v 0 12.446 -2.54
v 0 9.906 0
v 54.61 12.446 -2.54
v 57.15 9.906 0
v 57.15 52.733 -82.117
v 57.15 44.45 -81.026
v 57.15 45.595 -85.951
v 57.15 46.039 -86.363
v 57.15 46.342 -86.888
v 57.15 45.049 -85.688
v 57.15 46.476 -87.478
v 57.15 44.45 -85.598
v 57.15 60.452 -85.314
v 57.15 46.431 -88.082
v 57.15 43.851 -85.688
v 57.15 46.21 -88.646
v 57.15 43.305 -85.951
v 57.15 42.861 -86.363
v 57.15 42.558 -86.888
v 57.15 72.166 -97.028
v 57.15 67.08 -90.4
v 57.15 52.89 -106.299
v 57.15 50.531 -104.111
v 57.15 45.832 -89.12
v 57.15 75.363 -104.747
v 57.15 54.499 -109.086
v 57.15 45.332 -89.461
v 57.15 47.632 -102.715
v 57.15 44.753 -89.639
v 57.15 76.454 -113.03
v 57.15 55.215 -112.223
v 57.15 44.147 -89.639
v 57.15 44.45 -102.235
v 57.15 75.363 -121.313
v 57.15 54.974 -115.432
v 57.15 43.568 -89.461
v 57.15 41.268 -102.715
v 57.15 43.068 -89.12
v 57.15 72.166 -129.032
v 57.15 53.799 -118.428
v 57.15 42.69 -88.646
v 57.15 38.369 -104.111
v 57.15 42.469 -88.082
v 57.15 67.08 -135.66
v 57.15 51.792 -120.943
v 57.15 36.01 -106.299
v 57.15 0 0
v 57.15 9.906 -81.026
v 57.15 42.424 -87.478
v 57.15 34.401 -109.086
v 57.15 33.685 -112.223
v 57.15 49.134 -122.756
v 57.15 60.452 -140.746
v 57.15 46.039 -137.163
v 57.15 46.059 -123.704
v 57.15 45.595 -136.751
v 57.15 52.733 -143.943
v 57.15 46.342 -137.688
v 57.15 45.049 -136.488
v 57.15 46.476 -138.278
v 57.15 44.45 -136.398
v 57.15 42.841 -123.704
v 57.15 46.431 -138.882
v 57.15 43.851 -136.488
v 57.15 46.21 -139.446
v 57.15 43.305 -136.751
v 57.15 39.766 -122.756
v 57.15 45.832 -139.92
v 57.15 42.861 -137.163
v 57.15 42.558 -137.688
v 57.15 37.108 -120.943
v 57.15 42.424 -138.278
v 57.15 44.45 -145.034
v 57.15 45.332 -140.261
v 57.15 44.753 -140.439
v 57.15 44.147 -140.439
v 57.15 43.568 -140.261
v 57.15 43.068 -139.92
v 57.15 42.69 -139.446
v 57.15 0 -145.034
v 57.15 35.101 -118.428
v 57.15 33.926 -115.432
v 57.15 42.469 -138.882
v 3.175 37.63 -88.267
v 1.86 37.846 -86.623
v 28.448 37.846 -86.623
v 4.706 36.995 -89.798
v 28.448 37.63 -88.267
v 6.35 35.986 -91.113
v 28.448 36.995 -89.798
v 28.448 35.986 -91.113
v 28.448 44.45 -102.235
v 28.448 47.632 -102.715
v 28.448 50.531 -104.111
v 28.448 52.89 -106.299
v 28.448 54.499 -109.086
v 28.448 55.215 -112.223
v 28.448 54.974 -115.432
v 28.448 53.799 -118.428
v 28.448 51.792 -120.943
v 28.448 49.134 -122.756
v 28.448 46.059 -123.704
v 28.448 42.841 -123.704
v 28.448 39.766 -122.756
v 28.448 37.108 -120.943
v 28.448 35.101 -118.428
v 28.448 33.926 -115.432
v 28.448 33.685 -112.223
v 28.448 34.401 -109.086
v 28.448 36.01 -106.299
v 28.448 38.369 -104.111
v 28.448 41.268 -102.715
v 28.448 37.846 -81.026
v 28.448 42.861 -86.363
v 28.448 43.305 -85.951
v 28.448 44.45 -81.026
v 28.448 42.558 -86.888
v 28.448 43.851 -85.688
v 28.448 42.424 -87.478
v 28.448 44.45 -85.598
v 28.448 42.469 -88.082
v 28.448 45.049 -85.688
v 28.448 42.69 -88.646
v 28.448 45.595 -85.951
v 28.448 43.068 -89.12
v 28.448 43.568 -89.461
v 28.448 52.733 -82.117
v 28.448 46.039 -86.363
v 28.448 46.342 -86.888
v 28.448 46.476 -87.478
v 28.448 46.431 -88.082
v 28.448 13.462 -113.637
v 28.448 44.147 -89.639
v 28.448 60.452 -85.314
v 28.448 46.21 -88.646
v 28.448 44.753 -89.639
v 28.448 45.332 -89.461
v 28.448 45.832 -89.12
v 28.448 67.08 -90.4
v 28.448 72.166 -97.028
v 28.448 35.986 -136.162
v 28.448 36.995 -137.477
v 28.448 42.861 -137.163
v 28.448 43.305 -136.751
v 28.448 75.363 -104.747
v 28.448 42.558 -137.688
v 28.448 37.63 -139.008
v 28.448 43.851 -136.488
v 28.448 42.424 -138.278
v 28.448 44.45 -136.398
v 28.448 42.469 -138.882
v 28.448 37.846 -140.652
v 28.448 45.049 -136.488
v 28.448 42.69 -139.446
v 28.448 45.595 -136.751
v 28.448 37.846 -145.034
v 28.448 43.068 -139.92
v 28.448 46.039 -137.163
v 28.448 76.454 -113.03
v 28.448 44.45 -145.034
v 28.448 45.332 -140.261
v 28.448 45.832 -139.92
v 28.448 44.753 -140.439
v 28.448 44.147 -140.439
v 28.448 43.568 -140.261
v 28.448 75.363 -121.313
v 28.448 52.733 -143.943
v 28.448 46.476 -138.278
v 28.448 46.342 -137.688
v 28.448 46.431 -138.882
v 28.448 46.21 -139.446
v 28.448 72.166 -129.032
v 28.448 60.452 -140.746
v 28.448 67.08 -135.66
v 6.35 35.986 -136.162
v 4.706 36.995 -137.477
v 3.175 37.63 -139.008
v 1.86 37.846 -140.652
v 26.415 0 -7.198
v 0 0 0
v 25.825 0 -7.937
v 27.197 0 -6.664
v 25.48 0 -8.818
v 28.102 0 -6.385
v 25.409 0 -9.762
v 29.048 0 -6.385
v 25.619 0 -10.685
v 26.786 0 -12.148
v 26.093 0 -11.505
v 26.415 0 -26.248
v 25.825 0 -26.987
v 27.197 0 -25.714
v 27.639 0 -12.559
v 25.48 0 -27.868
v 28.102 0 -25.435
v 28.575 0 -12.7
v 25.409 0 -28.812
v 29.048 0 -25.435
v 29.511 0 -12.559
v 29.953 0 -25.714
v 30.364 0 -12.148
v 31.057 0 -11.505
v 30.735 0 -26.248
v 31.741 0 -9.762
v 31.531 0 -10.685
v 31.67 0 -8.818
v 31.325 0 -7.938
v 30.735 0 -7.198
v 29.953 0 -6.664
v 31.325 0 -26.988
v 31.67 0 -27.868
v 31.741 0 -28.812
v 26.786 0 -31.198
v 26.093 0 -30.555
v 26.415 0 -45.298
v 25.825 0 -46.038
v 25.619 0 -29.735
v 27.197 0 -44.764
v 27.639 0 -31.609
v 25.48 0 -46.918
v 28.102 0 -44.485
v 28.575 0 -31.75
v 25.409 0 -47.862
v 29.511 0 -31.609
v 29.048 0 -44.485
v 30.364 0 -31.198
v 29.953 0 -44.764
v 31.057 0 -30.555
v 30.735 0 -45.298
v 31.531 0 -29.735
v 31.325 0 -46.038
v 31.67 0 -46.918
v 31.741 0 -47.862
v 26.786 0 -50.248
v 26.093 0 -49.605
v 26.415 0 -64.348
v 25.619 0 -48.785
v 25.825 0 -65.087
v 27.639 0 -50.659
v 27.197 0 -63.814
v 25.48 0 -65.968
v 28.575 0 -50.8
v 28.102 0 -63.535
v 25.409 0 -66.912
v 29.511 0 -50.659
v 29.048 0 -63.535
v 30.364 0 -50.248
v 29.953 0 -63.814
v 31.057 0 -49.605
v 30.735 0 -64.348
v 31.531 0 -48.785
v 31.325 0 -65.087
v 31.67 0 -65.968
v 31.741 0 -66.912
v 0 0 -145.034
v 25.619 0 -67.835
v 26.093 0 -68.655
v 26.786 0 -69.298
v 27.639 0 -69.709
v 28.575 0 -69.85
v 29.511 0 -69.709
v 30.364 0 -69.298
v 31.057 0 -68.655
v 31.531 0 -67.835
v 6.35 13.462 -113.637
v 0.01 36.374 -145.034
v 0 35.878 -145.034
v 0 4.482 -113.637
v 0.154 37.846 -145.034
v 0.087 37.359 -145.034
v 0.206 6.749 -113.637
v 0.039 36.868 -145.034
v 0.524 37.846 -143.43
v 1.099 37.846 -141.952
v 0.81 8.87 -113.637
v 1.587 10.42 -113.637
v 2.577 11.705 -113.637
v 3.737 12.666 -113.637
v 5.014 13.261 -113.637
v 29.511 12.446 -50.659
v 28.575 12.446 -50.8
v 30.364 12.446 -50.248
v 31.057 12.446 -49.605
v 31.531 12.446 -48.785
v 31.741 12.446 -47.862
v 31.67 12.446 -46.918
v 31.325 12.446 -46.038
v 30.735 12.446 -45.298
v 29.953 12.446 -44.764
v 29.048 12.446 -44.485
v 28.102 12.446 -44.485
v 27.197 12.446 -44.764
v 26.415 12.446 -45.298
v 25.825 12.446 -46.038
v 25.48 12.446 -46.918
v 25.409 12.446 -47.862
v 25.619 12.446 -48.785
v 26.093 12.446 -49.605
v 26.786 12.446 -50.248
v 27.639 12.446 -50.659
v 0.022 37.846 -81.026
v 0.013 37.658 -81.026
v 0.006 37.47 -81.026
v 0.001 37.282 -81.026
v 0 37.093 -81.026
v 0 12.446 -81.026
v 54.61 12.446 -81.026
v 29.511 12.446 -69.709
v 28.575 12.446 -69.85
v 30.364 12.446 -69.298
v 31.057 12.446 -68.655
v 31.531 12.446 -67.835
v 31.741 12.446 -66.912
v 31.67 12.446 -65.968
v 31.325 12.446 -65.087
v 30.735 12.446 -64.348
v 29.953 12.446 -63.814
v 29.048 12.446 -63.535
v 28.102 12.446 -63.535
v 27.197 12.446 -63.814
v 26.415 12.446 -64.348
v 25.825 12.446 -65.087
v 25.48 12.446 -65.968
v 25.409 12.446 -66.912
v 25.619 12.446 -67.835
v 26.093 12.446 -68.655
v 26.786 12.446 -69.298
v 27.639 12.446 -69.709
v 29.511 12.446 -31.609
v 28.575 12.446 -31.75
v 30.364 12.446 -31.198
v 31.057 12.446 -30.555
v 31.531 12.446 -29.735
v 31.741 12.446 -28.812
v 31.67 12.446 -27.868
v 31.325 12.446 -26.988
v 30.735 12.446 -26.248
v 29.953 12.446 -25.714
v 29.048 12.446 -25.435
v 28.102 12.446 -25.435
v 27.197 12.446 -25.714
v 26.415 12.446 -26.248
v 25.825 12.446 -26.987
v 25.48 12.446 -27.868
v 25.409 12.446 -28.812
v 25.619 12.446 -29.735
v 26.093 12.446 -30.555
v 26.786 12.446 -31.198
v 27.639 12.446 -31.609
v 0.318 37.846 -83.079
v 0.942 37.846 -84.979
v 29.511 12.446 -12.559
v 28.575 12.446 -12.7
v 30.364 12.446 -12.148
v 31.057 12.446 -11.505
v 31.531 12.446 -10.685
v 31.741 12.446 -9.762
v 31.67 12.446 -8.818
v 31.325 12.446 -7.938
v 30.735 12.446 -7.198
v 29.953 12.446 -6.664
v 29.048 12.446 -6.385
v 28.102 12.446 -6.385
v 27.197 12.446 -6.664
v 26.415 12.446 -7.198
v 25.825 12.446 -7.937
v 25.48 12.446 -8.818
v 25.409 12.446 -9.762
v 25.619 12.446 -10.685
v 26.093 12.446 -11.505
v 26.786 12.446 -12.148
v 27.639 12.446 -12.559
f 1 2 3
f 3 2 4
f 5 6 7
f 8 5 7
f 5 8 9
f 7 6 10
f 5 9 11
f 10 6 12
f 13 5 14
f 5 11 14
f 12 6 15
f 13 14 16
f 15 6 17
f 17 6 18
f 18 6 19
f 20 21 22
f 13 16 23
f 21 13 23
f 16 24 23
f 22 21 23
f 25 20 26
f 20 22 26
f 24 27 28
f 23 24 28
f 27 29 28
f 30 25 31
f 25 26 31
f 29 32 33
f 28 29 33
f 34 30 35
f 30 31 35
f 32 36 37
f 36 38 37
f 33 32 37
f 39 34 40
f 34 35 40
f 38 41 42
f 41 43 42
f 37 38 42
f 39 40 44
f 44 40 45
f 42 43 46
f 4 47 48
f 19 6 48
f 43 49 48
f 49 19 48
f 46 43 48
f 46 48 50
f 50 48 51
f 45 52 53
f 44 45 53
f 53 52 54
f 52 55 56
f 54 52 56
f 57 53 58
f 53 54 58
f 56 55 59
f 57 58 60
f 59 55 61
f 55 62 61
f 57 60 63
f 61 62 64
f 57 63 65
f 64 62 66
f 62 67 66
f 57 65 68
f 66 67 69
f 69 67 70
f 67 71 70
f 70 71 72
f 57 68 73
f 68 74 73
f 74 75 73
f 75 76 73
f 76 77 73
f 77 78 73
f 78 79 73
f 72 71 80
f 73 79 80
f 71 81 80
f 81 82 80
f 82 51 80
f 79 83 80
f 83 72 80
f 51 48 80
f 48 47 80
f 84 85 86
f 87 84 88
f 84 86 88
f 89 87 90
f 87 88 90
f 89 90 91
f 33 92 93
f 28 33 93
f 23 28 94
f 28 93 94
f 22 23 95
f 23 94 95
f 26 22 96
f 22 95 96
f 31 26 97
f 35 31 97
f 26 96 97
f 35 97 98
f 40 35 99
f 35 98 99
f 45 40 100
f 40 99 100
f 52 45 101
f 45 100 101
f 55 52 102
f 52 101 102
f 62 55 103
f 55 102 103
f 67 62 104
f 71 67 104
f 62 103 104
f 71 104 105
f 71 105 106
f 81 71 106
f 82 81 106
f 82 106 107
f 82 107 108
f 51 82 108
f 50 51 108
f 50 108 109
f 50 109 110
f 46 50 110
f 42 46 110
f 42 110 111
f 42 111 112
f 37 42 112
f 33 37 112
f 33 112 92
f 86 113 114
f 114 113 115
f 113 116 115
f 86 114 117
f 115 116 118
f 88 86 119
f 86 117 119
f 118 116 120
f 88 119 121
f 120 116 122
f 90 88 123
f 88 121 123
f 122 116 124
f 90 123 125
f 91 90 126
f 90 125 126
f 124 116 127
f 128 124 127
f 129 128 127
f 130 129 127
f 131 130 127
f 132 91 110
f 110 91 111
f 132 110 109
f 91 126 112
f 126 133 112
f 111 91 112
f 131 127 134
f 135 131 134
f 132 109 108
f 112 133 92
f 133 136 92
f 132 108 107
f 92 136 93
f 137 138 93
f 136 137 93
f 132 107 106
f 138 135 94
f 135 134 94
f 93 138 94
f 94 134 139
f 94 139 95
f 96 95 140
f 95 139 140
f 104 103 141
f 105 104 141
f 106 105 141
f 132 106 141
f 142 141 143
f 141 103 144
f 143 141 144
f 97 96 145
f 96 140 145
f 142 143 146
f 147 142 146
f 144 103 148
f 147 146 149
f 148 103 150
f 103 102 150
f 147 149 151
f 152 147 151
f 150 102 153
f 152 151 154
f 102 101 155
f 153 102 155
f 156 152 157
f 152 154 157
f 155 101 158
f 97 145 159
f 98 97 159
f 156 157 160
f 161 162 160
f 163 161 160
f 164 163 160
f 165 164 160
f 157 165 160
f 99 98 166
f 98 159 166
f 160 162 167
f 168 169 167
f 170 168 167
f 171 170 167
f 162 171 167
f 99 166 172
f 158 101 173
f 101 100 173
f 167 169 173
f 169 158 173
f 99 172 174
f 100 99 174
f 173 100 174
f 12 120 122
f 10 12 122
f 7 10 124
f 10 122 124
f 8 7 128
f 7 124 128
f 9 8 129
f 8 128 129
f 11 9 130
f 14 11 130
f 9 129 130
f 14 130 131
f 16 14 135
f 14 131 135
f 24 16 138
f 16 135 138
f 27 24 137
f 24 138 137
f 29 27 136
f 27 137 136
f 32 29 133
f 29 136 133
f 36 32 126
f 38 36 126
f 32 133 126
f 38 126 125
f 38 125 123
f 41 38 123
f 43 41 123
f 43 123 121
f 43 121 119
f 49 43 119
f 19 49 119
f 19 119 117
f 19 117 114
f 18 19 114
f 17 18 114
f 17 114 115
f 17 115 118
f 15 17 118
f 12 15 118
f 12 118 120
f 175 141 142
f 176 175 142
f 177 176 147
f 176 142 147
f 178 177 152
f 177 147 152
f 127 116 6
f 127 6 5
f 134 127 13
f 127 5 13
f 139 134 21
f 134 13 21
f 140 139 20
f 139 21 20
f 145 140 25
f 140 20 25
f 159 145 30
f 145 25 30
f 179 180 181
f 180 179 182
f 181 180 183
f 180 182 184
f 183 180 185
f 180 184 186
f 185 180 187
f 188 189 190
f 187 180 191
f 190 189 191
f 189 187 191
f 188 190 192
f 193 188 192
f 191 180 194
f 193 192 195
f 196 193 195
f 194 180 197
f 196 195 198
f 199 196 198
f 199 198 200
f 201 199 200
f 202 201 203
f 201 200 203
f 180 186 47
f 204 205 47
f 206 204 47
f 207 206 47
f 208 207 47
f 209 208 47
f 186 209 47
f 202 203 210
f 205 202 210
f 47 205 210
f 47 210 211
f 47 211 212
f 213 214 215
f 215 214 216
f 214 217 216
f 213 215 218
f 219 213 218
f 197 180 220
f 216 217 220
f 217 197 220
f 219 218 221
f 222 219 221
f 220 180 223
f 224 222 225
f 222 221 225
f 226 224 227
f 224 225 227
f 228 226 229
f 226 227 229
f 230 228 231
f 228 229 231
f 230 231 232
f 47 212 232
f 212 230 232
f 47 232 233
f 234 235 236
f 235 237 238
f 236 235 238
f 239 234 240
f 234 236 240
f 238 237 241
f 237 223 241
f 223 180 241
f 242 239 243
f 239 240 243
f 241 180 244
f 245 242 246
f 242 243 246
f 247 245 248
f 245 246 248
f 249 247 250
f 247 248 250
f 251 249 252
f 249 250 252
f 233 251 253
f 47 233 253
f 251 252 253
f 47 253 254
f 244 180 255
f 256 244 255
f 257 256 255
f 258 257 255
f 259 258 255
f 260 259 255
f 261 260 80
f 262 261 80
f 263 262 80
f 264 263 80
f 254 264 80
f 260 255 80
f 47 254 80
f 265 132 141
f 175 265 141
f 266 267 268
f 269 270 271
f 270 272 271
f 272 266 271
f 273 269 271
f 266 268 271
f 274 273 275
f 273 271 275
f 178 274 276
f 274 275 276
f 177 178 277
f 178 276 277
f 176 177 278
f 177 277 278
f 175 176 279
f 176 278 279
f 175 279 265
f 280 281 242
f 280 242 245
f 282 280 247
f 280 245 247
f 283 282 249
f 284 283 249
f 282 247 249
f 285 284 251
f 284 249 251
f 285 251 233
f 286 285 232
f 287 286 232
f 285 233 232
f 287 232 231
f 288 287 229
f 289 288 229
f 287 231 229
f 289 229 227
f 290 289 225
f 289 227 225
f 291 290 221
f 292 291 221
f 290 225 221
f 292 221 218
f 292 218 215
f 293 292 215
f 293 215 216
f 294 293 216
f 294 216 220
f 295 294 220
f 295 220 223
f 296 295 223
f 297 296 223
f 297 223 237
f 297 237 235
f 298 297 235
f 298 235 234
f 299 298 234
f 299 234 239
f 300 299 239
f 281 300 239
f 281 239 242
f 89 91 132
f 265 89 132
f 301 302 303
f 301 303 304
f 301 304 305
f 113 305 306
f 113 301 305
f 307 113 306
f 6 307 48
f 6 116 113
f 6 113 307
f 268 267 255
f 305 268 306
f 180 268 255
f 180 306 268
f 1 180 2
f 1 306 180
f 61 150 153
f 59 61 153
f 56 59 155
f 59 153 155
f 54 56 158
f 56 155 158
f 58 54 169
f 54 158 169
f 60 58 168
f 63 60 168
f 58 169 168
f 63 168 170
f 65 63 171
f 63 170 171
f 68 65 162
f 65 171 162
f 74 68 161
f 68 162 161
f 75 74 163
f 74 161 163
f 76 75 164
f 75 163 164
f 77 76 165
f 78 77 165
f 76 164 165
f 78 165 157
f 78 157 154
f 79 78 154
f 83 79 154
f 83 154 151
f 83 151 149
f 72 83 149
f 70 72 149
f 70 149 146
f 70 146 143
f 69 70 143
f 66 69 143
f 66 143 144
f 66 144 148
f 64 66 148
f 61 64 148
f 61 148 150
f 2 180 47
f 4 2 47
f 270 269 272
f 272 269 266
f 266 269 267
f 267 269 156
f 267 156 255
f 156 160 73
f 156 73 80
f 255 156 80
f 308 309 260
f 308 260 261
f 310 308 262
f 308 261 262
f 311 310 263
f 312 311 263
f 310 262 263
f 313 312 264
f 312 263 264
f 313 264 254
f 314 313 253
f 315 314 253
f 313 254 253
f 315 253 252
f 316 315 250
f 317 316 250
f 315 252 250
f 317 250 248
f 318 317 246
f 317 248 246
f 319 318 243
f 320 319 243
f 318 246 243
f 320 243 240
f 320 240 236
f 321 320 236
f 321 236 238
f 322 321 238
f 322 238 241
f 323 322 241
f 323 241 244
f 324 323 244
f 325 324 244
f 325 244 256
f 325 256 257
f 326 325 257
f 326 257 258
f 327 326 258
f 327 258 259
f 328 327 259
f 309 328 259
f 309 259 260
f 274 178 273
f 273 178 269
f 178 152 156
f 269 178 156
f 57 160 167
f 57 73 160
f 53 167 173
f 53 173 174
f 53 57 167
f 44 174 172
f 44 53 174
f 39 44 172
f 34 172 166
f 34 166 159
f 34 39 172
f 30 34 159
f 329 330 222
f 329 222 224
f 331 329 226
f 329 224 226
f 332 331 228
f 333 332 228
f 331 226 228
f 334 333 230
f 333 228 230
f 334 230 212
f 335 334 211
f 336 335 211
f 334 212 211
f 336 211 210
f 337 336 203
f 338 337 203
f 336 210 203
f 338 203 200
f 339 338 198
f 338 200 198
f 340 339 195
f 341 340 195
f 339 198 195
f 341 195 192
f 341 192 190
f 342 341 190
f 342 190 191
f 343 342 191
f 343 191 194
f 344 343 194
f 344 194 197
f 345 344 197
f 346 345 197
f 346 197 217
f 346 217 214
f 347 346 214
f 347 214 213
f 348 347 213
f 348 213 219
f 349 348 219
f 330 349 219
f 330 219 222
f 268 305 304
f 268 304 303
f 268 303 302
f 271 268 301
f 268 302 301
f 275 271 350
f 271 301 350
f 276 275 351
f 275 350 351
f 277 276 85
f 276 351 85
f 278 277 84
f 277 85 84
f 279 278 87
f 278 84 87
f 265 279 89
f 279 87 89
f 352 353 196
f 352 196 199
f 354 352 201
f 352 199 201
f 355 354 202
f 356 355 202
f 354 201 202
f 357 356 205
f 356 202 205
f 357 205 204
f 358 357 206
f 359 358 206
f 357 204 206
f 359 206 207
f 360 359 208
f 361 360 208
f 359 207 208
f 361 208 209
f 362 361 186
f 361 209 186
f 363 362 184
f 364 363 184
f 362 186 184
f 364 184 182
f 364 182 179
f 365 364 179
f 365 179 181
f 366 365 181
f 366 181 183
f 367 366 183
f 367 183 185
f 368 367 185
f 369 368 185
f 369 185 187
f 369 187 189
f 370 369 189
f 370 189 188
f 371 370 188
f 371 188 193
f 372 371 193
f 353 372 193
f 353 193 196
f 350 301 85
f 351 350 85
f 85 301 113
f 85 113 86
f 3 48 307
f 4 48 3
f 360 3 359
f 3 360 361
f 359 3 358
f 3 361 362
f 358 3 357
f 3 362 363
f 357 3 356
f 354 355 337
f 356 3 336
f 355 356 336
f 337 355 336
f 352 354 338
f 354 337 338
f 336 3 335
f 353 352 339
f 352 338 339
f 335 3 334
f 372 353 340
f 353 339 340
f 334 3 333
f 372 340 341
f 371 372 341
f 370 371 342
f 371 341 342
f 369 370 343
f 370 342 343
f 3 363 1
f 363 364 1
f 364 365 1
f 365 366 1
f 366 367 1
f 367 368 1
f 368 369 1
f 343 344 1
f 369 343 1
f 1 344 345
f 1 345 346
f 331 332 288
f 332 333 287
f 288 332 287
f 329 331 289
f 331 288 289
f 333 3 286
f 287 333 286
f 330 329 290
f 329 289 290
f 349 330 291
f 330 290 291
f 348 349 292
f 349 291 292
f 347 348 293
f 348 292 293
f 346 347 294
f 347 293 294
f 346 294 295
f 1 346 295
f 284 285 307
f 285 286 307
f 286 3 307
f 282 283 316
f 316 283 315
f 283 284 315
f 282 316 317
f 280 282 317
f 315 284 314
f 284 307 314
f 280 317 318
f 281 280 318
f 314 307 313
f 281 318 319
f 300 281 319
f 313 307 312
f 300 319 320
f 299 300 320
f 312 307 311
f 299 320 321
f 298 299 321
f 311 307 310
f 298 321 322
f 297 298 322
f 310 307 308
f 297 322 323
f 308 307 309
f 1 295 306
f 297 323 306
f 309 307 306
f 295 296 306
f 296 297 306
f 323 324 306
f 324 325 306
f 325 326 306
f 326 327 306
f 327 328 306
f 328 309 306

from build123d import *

# Parameters (mm, degrees)
SKETCH1_W           = 57.15
SKETCH1_H           = 145.034
BOSS_EXTRUDE1_DEPTH = 25.4
SKETCH4_R           = 3.175
CUT_EXTRUDE3_DEPTH  = 158.943482474
SKETCH7_W           = 28.702
SKETCH7_H           = 64.008
BOSS_EXTRUDE2_DEPTH = 76.454
FILLET1_R           = 32.004
SKETCH9_R           = 10.795
SKETCH9_R_2         = 2.032
CUT_EXTRUDE5_DEPTH  = 76.454
CUT_EXTRUDE7_DEPTH  = 12.954
CHAMFER1_SIZE       = 2.54
BOSS_EXTRUDE4_DEPTH = 28.448
FILLET3_R           = 6.35


# Some blends are built 0.0001 mm under size
with BuildPart() as part:
    # Sketch1 → Boss-Extrude1 (new body)
    with BuildSketch(Plane(origin=(0, 0, 0), x_dir=(1, 0, 0), z_dir=(0, 1, 0))):
        with Locations((28.575, 72.517)):
            Rectangle(SKETCH1_W, SKETCH1_H)
    extrude(amount=BOSS_EXTRUDE1_DEPTH)

    # Sketch4 → Cut-Extrude3 (cut, through all)
    with BuildSketch(Plane(origin=(0, 0, 0), x_dir=(-1, 0, 0), z_dir=(0, -1, 0))):
        with Locations(Location((-28.575, 9.525, 0), (0, 0, 90))):
            Circle(SKETCH4_R)
        with Locations(Location((-28.575, 28.575, 0), (0, 0, 90))):
            Circle(SKETCH4_R)
        with Locations(Location((-28.575, 47.625, 0), (0, 0, 90))):
            Circle(SKETCH4_R)
        with Locations(Location((-28.575, 66.675, 0), (0, 0, 90))):
            Circle(SKETCH4_R)
    extrude(amount=-CUT_EXTRUDE3_DEPTH, mode=Mode.SUBTRACT)

    # Sketch7 → Boss-Extrude2 (add)
    with BuildSketch(Plane.XZ):
        with Locations((42.799, -113.03)):
            Rectangle(SKETCH7_W, SKETCH7_H)
    extrude(amount=-BOSS_EXTRUDE2_DEPTH)

    # Fillet1
    fillet1_edges = [part.edges().sort_by_distance(p)[0] for p in [
        (42.799, 76.454, -145.034),
        (42.799, 76.454, -81.026),
    ]]
    fillet(fillet1_edges, radius=FILLET1_R - 0.0001)  # a hair under: the kernel refuses the full size

    # Sketch9 → Cut-Extrude5 (cut)
    with BuildSketch(Plane.ZY.offset(-28.448)):
        with Locations((-113.03, 44.45)):
            Circle(SKETCH9_R)
        with Locations((-138.43, 44.45)):
            Circle(SKETCH9_R_2)
        with Locations((-87.63, 44.45)):
            Circle(SKETCH9_R_2)
    extrude(amount=-CUT_EXTRUDE5_DEPTH, mode=Mode.SUBTRACT)

    # Sketch10 → Cut-Extrude7 (cut)
    with BuildSketch(Plane(origin=(0, 25.4, 0), x_dir=(1, 0, 0), z_dir=(0, 1, 0))):
        Polygon((28.448, 113.03), (28.448, 81.026), (57.15, 81.026), (57.15, 0), (50.8, 0), (0, 0), (0, 113.03), (0, 145.034), (28.448, 145.034), align=None)
    extrude(amount=-CUT_EXTRUDE7_DEPTH, mode=Mode.SUBTRACT)

    # Chamfer1
    chamfer1_edges = [part.edges().sort_by_distance(p)[0] for p in [
        (57.15, 12.446, -40.513),
        (28.575, 12.446, 0),
    ]]
    chamfer(chamfer1_edges, length=CHAMFER1_SIZE)

    # Sketch14 → Boss-Extrude4 (add)
    with BuildSketch(Plane.ZY.offset(-28.448)):
        Polygon((-113.637411412, 13.462), (-138.021411412, 37.846), (-145.034, 37.846), (-145.034, 12.446), (-81.026, 12.446), (-81.026, 37.846), (-89.253411412, 37.846), align=None)
    extrude(amount=BOSS_EXTRUDE4_DEPTH)

    # Fillet3
    # the kernel refuses this fillet: 6.35 mm, written as the material it takes off along each edge
    with BuildSketch(Plane(origin=(0, 49.071320151, -78.028091261), x_dir=(1, 0, 0), z_dir=(0, -0.707106781186549, -0.7071067811865461)), Plane(origin=(0, 13.462, -113.637411412), x_dir=(1, 0, 0), z_dir=(0, 0.7071067811865438, -0.7071067811865512))) as fillet3_piece_1:
        with BuildLine():
            CenterArc((FILLET3_R, FILLET3_R), FILLET3_R, 180, 90)
            Line((0, FILLET3_R), (0, 0))
            Line((0, 0), (FILLET3_R, 0))
        make_face()
    extrude(amount=50.359183505, mode=Mode.SUBTRACT)
    with BuildSketch(Plane(origin=(28.448, 37.846, -89.253411412), x_dir=(0, -0.7071067811865475, -0.7071067811865475), z_dir=(-1, 0, 0)), Plane(origin=(28.448, 37.846, -138.021411412), x_dir=(0, 0, -1), z_dir=(-1, 0, 0))) as fillet3_piece_2:
        with BuildLine():
            CenterArc((FILLET3_R * 0.414213562373, FILLET3_R), FILLET3_R, 225, 45)
            Line((-FILLET3_R * 0.292893218813, FILLET3_R * 0.292893218813), (0, 0))
            Line((0, 0), (FILLET3_R * 0.414213562373, 0))
        make_face()
    extrude(amount=35.023640303, mode=Mode.SUBTRACT)
    with BuildSketch(Plane(origin=(0, 2.236679849, -102.412091261), x_dir=(1, 0, 0), z_dir=(0, 0.7071067811865438, -0.7071067811865512))) as fillet3_piece_3a_section:
        with BuildLine():
            CenterArc((FILLET3_R, FILLET3_R), FILLET3_R, 180, 90)
            Line((0, FILLET3_R), (0, 0))
            Line((0, 0), (FILLET3_R, 0))
        make_face()
    fillet3_piece_3a = extrude(amount=66.234183505, mode=Mode.PRIVATE)
    fillet3_piece_3a = split(fillet3_piece_3a, bisect_by=Plane(origin=(1.437608976, 12.445456945, -114.653954468), z_dir=(0, -0.7071067811865461, 0.707106781186549)), keep=Keep.TOP, mode=Mode.PRIVATE)
    with BuildSketch(Plane(origin=(0, 49.071320151, -78.028091261), x_dir=(1, 0, 0), z_dir=(0, -0.707106781186549, -0.7071067811865461))) as fillet3_piece_3b_section:
        with BuildLine():
            CenterArc((FILLET3_R, FILLET3_R), FILLET3_R, 180, 90)
            Line((0, FILLET3_R), (0, 0))
            Line((0, 0), (FILLET3_R, 0))
        make_face()
    fillet3_piece_3b = extrude(amount=66.234183505, mode=Mode.PRIVATE)
    fillet3_piece_3b = split(fillet3_piece_3b, bisect_by=Plane(origin=(1.437608976, 12.445456945, -112.620868357), z_dir=(0, -0.7071067811865512, -0.7071067811865438)), keep=Keep.TOP, mode=Mode.PRIVATE)
    fillet3_piece_3 = fillet3_piece_3a & fillet3_piece_3b
    add(fillet3_piece_3, mode=Mode.SUBTRACT)


solid = part.part
